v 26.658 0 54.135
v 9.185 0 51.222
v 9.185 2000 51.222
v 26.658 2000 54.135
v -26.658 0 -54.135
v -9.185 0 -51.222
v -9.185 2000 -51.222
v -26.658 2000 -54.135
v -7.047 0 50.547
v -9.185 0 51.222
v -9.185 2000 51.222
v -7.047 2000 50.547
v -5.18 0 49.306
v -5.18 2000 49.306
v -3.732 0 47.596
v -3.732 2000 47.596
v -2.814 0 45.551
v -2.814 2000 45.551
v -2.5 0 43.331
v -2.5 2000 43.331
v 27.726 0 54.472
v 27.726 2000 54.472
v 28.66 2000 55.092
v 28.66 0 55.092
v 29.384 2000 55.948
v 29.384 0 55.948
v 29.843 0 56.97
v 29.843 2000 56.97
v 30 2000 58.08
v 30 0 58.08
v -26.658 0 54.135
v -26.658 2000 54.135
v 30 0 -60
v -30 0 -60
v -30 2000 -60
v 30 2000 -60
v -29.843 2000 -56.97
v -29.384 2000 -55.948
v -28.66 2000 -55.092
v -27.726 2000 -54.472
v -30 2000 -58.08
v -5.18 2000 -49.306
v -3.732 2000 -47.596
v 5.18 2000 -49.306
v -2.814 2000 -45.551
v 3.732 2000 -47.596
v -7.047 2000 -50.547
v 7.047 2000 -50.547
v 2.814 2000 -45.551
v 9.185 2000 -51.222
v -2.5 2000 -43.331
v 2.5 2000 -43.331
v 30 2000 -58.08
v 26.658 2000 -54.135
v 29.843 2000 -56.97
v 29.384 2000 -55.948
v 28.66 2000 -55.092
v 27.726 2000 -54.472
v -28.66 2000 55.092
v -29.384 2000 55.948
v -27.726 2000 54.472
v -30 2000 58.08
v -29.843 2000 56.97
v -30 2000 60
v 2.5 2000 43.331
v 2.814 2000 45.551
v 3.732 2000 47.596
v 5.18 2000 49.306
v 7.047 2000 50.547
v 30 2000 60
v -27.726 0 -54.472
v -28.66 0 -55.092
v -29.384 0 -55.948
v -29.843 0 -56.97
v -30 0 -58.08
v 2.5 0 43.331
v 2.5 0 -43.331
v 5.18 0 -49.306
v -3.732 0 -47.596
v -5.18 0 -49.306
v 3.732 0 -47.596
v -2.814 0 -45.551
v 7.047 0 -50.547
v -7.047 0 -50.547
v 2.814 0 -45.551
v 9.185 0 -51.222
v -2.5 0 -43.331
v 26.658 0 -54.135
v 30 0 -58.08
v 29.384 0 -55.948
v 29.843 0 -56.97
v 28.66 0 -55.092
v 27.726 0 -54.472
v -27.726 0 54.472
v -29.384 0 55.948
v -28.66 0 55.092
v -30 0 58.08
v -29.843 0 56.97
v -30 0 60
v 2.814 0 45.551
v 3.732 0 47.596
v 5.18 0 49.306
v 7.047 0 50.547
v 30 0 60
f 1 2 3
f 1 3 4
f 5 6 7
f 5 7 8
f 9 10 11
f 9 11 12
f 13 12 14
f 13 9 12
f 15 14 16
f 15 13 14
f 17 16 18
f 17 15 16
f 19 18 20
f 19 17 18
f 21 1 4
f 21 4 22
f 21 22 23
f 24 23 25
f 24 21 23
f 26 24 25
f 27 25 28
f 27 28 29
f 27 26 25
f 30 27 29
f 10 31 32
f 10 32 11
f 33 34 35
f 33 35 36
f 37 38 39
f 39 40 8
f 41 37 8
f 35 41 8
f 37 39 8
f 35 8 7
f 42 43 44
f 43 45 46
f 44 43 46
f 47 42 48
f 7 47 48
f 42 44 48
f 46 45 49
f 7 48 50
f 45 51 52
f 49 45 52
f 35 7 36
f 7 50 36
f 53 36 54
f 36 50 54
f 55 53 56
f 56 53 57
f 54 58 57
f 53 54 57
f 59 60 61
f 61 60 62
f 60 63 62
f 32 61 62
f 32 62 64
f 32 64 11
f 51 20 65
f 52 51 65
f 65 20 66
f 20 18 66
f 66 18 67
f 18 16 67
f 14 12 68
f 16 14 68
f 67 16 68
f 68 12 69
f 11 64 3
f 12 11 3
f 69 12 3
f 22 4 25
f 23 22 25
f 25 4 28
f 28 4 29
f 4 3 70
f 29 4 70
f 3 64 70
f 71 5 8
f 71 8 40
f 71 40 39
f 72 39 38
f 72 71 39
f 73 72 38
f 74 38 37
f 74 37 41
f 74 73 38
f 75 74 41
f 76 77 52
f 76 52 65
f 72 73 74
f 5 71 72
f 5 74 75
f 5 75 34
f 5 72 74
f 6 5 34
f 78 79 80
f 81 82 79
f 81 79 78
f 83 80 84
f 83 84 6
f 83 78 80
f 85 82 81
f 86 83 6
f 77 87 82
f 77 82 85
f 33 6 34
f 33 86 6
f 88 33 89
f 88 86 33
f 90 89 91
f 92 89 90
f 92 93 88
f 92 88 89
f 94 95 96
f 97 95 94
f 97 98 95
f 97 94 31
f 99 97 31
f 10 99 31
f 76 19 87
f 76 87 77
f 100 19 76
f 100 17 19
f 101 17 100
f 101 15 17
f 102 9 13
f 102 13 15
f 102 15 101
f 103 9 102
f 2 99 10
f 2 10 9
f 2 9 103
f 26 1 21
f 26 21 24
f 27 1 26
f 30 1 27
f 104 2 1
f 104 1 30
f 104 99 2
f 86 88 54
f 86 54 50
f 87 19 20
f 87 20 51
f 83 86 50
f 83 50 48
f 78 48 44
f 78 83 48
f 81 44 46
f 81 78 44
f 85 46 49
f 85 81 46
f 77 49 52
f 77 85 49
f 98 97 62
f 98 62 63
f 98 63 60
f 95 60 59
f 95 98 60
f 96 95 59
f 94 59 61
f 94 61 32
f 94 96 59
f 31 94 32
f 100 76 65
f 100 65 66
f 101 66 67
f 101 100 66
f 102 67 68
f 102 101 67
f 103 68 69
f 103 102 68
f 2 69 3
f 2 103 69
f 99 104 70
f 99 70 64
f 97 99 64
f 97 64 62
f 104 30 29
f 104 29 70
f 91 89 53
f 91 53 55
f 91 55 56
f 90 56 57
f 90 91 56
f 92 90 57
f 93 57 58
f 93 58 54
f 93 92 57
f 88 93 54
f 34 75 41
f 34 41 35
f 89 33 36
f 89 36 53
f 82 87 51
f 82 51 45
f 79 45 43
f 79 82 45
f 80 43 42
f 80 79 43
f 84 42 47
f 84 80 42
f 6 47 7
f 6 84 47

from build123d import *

# Parameters (mm, degrees)
SB_BEAM_120_X_12_1_DEPTH = 2000


with BuildPart() as part:
    # Sketch15 → Sb beam 120 X 12(1) (new body)
    with BuildSketch(Plane(origin=(0, 0, 0), x_dir=(-1, 0, 0), z_dir=(0, 1, 0))):
        with BuildLine():
            Line((-30, -60), (-30, -58.080070835))
            ThreePointArc((-30, -58.080070835), (-29.052095223, -55.494589303), (-26.657642624, -54.134502919))
            Line((-26.657642624, -54.134502919), (-9.184714752, -51.222135832))
            ThreePointArc((-9.184714752, -51.222135832), (-4.395809555, -48.501963064), (-2.5, -43.331))
            Line((-2.5, -43.331), (-2.5, 43.331))
            ThreePointArc((-2.5, 43.331), (-4.395809555, 48.501963064), (-9.184714752, 51.222135832))
            Line((-9.184714752, 51.222135832), (-26.657642624, 54.134502919))
            ThreePointArc((-26.657642624, 54.134502919), (-29.052095223, 55.494589303), (-30, 58.080070835))
            Line((-30, 58.080070835), (-30, 60))
            Line((-30, 60), (30, 60))
            Line((30, 60), (30, 58.080070835))
            ThreePointArc((30, 58.080070835), (29.052095223, 55.494589303), (26.657642624, 54.134502919))
            Line((26.657642624, 54.134502919), (9.184714752, 51.222135832))
            ThreePointArc((9.184714752, 51.222135832), (4.395809555, 48.501963064), (2.5, 43.331))
            Line((2.5, 43.331), (2.5, -43.331))
            ThreePointArc((2.5, -43.331), (4.395809555, -48.501963064), (9.184714752, -51.222135832))
            Line((9.184714752, -51.222135832), (26.657642624, -54.134502919))
            ThreePointArc((26.657642624, -54.134502919), (29.052095223, -55.494589303), (30, -58.080070835))
            Line((30, -58.080070835), (30, -60))
            Line((30, -60), (-30, -60))
        make_face()
    extrude(amount=SB_BEAM_120_X_12_1_DEPTH)


solid = part.part
